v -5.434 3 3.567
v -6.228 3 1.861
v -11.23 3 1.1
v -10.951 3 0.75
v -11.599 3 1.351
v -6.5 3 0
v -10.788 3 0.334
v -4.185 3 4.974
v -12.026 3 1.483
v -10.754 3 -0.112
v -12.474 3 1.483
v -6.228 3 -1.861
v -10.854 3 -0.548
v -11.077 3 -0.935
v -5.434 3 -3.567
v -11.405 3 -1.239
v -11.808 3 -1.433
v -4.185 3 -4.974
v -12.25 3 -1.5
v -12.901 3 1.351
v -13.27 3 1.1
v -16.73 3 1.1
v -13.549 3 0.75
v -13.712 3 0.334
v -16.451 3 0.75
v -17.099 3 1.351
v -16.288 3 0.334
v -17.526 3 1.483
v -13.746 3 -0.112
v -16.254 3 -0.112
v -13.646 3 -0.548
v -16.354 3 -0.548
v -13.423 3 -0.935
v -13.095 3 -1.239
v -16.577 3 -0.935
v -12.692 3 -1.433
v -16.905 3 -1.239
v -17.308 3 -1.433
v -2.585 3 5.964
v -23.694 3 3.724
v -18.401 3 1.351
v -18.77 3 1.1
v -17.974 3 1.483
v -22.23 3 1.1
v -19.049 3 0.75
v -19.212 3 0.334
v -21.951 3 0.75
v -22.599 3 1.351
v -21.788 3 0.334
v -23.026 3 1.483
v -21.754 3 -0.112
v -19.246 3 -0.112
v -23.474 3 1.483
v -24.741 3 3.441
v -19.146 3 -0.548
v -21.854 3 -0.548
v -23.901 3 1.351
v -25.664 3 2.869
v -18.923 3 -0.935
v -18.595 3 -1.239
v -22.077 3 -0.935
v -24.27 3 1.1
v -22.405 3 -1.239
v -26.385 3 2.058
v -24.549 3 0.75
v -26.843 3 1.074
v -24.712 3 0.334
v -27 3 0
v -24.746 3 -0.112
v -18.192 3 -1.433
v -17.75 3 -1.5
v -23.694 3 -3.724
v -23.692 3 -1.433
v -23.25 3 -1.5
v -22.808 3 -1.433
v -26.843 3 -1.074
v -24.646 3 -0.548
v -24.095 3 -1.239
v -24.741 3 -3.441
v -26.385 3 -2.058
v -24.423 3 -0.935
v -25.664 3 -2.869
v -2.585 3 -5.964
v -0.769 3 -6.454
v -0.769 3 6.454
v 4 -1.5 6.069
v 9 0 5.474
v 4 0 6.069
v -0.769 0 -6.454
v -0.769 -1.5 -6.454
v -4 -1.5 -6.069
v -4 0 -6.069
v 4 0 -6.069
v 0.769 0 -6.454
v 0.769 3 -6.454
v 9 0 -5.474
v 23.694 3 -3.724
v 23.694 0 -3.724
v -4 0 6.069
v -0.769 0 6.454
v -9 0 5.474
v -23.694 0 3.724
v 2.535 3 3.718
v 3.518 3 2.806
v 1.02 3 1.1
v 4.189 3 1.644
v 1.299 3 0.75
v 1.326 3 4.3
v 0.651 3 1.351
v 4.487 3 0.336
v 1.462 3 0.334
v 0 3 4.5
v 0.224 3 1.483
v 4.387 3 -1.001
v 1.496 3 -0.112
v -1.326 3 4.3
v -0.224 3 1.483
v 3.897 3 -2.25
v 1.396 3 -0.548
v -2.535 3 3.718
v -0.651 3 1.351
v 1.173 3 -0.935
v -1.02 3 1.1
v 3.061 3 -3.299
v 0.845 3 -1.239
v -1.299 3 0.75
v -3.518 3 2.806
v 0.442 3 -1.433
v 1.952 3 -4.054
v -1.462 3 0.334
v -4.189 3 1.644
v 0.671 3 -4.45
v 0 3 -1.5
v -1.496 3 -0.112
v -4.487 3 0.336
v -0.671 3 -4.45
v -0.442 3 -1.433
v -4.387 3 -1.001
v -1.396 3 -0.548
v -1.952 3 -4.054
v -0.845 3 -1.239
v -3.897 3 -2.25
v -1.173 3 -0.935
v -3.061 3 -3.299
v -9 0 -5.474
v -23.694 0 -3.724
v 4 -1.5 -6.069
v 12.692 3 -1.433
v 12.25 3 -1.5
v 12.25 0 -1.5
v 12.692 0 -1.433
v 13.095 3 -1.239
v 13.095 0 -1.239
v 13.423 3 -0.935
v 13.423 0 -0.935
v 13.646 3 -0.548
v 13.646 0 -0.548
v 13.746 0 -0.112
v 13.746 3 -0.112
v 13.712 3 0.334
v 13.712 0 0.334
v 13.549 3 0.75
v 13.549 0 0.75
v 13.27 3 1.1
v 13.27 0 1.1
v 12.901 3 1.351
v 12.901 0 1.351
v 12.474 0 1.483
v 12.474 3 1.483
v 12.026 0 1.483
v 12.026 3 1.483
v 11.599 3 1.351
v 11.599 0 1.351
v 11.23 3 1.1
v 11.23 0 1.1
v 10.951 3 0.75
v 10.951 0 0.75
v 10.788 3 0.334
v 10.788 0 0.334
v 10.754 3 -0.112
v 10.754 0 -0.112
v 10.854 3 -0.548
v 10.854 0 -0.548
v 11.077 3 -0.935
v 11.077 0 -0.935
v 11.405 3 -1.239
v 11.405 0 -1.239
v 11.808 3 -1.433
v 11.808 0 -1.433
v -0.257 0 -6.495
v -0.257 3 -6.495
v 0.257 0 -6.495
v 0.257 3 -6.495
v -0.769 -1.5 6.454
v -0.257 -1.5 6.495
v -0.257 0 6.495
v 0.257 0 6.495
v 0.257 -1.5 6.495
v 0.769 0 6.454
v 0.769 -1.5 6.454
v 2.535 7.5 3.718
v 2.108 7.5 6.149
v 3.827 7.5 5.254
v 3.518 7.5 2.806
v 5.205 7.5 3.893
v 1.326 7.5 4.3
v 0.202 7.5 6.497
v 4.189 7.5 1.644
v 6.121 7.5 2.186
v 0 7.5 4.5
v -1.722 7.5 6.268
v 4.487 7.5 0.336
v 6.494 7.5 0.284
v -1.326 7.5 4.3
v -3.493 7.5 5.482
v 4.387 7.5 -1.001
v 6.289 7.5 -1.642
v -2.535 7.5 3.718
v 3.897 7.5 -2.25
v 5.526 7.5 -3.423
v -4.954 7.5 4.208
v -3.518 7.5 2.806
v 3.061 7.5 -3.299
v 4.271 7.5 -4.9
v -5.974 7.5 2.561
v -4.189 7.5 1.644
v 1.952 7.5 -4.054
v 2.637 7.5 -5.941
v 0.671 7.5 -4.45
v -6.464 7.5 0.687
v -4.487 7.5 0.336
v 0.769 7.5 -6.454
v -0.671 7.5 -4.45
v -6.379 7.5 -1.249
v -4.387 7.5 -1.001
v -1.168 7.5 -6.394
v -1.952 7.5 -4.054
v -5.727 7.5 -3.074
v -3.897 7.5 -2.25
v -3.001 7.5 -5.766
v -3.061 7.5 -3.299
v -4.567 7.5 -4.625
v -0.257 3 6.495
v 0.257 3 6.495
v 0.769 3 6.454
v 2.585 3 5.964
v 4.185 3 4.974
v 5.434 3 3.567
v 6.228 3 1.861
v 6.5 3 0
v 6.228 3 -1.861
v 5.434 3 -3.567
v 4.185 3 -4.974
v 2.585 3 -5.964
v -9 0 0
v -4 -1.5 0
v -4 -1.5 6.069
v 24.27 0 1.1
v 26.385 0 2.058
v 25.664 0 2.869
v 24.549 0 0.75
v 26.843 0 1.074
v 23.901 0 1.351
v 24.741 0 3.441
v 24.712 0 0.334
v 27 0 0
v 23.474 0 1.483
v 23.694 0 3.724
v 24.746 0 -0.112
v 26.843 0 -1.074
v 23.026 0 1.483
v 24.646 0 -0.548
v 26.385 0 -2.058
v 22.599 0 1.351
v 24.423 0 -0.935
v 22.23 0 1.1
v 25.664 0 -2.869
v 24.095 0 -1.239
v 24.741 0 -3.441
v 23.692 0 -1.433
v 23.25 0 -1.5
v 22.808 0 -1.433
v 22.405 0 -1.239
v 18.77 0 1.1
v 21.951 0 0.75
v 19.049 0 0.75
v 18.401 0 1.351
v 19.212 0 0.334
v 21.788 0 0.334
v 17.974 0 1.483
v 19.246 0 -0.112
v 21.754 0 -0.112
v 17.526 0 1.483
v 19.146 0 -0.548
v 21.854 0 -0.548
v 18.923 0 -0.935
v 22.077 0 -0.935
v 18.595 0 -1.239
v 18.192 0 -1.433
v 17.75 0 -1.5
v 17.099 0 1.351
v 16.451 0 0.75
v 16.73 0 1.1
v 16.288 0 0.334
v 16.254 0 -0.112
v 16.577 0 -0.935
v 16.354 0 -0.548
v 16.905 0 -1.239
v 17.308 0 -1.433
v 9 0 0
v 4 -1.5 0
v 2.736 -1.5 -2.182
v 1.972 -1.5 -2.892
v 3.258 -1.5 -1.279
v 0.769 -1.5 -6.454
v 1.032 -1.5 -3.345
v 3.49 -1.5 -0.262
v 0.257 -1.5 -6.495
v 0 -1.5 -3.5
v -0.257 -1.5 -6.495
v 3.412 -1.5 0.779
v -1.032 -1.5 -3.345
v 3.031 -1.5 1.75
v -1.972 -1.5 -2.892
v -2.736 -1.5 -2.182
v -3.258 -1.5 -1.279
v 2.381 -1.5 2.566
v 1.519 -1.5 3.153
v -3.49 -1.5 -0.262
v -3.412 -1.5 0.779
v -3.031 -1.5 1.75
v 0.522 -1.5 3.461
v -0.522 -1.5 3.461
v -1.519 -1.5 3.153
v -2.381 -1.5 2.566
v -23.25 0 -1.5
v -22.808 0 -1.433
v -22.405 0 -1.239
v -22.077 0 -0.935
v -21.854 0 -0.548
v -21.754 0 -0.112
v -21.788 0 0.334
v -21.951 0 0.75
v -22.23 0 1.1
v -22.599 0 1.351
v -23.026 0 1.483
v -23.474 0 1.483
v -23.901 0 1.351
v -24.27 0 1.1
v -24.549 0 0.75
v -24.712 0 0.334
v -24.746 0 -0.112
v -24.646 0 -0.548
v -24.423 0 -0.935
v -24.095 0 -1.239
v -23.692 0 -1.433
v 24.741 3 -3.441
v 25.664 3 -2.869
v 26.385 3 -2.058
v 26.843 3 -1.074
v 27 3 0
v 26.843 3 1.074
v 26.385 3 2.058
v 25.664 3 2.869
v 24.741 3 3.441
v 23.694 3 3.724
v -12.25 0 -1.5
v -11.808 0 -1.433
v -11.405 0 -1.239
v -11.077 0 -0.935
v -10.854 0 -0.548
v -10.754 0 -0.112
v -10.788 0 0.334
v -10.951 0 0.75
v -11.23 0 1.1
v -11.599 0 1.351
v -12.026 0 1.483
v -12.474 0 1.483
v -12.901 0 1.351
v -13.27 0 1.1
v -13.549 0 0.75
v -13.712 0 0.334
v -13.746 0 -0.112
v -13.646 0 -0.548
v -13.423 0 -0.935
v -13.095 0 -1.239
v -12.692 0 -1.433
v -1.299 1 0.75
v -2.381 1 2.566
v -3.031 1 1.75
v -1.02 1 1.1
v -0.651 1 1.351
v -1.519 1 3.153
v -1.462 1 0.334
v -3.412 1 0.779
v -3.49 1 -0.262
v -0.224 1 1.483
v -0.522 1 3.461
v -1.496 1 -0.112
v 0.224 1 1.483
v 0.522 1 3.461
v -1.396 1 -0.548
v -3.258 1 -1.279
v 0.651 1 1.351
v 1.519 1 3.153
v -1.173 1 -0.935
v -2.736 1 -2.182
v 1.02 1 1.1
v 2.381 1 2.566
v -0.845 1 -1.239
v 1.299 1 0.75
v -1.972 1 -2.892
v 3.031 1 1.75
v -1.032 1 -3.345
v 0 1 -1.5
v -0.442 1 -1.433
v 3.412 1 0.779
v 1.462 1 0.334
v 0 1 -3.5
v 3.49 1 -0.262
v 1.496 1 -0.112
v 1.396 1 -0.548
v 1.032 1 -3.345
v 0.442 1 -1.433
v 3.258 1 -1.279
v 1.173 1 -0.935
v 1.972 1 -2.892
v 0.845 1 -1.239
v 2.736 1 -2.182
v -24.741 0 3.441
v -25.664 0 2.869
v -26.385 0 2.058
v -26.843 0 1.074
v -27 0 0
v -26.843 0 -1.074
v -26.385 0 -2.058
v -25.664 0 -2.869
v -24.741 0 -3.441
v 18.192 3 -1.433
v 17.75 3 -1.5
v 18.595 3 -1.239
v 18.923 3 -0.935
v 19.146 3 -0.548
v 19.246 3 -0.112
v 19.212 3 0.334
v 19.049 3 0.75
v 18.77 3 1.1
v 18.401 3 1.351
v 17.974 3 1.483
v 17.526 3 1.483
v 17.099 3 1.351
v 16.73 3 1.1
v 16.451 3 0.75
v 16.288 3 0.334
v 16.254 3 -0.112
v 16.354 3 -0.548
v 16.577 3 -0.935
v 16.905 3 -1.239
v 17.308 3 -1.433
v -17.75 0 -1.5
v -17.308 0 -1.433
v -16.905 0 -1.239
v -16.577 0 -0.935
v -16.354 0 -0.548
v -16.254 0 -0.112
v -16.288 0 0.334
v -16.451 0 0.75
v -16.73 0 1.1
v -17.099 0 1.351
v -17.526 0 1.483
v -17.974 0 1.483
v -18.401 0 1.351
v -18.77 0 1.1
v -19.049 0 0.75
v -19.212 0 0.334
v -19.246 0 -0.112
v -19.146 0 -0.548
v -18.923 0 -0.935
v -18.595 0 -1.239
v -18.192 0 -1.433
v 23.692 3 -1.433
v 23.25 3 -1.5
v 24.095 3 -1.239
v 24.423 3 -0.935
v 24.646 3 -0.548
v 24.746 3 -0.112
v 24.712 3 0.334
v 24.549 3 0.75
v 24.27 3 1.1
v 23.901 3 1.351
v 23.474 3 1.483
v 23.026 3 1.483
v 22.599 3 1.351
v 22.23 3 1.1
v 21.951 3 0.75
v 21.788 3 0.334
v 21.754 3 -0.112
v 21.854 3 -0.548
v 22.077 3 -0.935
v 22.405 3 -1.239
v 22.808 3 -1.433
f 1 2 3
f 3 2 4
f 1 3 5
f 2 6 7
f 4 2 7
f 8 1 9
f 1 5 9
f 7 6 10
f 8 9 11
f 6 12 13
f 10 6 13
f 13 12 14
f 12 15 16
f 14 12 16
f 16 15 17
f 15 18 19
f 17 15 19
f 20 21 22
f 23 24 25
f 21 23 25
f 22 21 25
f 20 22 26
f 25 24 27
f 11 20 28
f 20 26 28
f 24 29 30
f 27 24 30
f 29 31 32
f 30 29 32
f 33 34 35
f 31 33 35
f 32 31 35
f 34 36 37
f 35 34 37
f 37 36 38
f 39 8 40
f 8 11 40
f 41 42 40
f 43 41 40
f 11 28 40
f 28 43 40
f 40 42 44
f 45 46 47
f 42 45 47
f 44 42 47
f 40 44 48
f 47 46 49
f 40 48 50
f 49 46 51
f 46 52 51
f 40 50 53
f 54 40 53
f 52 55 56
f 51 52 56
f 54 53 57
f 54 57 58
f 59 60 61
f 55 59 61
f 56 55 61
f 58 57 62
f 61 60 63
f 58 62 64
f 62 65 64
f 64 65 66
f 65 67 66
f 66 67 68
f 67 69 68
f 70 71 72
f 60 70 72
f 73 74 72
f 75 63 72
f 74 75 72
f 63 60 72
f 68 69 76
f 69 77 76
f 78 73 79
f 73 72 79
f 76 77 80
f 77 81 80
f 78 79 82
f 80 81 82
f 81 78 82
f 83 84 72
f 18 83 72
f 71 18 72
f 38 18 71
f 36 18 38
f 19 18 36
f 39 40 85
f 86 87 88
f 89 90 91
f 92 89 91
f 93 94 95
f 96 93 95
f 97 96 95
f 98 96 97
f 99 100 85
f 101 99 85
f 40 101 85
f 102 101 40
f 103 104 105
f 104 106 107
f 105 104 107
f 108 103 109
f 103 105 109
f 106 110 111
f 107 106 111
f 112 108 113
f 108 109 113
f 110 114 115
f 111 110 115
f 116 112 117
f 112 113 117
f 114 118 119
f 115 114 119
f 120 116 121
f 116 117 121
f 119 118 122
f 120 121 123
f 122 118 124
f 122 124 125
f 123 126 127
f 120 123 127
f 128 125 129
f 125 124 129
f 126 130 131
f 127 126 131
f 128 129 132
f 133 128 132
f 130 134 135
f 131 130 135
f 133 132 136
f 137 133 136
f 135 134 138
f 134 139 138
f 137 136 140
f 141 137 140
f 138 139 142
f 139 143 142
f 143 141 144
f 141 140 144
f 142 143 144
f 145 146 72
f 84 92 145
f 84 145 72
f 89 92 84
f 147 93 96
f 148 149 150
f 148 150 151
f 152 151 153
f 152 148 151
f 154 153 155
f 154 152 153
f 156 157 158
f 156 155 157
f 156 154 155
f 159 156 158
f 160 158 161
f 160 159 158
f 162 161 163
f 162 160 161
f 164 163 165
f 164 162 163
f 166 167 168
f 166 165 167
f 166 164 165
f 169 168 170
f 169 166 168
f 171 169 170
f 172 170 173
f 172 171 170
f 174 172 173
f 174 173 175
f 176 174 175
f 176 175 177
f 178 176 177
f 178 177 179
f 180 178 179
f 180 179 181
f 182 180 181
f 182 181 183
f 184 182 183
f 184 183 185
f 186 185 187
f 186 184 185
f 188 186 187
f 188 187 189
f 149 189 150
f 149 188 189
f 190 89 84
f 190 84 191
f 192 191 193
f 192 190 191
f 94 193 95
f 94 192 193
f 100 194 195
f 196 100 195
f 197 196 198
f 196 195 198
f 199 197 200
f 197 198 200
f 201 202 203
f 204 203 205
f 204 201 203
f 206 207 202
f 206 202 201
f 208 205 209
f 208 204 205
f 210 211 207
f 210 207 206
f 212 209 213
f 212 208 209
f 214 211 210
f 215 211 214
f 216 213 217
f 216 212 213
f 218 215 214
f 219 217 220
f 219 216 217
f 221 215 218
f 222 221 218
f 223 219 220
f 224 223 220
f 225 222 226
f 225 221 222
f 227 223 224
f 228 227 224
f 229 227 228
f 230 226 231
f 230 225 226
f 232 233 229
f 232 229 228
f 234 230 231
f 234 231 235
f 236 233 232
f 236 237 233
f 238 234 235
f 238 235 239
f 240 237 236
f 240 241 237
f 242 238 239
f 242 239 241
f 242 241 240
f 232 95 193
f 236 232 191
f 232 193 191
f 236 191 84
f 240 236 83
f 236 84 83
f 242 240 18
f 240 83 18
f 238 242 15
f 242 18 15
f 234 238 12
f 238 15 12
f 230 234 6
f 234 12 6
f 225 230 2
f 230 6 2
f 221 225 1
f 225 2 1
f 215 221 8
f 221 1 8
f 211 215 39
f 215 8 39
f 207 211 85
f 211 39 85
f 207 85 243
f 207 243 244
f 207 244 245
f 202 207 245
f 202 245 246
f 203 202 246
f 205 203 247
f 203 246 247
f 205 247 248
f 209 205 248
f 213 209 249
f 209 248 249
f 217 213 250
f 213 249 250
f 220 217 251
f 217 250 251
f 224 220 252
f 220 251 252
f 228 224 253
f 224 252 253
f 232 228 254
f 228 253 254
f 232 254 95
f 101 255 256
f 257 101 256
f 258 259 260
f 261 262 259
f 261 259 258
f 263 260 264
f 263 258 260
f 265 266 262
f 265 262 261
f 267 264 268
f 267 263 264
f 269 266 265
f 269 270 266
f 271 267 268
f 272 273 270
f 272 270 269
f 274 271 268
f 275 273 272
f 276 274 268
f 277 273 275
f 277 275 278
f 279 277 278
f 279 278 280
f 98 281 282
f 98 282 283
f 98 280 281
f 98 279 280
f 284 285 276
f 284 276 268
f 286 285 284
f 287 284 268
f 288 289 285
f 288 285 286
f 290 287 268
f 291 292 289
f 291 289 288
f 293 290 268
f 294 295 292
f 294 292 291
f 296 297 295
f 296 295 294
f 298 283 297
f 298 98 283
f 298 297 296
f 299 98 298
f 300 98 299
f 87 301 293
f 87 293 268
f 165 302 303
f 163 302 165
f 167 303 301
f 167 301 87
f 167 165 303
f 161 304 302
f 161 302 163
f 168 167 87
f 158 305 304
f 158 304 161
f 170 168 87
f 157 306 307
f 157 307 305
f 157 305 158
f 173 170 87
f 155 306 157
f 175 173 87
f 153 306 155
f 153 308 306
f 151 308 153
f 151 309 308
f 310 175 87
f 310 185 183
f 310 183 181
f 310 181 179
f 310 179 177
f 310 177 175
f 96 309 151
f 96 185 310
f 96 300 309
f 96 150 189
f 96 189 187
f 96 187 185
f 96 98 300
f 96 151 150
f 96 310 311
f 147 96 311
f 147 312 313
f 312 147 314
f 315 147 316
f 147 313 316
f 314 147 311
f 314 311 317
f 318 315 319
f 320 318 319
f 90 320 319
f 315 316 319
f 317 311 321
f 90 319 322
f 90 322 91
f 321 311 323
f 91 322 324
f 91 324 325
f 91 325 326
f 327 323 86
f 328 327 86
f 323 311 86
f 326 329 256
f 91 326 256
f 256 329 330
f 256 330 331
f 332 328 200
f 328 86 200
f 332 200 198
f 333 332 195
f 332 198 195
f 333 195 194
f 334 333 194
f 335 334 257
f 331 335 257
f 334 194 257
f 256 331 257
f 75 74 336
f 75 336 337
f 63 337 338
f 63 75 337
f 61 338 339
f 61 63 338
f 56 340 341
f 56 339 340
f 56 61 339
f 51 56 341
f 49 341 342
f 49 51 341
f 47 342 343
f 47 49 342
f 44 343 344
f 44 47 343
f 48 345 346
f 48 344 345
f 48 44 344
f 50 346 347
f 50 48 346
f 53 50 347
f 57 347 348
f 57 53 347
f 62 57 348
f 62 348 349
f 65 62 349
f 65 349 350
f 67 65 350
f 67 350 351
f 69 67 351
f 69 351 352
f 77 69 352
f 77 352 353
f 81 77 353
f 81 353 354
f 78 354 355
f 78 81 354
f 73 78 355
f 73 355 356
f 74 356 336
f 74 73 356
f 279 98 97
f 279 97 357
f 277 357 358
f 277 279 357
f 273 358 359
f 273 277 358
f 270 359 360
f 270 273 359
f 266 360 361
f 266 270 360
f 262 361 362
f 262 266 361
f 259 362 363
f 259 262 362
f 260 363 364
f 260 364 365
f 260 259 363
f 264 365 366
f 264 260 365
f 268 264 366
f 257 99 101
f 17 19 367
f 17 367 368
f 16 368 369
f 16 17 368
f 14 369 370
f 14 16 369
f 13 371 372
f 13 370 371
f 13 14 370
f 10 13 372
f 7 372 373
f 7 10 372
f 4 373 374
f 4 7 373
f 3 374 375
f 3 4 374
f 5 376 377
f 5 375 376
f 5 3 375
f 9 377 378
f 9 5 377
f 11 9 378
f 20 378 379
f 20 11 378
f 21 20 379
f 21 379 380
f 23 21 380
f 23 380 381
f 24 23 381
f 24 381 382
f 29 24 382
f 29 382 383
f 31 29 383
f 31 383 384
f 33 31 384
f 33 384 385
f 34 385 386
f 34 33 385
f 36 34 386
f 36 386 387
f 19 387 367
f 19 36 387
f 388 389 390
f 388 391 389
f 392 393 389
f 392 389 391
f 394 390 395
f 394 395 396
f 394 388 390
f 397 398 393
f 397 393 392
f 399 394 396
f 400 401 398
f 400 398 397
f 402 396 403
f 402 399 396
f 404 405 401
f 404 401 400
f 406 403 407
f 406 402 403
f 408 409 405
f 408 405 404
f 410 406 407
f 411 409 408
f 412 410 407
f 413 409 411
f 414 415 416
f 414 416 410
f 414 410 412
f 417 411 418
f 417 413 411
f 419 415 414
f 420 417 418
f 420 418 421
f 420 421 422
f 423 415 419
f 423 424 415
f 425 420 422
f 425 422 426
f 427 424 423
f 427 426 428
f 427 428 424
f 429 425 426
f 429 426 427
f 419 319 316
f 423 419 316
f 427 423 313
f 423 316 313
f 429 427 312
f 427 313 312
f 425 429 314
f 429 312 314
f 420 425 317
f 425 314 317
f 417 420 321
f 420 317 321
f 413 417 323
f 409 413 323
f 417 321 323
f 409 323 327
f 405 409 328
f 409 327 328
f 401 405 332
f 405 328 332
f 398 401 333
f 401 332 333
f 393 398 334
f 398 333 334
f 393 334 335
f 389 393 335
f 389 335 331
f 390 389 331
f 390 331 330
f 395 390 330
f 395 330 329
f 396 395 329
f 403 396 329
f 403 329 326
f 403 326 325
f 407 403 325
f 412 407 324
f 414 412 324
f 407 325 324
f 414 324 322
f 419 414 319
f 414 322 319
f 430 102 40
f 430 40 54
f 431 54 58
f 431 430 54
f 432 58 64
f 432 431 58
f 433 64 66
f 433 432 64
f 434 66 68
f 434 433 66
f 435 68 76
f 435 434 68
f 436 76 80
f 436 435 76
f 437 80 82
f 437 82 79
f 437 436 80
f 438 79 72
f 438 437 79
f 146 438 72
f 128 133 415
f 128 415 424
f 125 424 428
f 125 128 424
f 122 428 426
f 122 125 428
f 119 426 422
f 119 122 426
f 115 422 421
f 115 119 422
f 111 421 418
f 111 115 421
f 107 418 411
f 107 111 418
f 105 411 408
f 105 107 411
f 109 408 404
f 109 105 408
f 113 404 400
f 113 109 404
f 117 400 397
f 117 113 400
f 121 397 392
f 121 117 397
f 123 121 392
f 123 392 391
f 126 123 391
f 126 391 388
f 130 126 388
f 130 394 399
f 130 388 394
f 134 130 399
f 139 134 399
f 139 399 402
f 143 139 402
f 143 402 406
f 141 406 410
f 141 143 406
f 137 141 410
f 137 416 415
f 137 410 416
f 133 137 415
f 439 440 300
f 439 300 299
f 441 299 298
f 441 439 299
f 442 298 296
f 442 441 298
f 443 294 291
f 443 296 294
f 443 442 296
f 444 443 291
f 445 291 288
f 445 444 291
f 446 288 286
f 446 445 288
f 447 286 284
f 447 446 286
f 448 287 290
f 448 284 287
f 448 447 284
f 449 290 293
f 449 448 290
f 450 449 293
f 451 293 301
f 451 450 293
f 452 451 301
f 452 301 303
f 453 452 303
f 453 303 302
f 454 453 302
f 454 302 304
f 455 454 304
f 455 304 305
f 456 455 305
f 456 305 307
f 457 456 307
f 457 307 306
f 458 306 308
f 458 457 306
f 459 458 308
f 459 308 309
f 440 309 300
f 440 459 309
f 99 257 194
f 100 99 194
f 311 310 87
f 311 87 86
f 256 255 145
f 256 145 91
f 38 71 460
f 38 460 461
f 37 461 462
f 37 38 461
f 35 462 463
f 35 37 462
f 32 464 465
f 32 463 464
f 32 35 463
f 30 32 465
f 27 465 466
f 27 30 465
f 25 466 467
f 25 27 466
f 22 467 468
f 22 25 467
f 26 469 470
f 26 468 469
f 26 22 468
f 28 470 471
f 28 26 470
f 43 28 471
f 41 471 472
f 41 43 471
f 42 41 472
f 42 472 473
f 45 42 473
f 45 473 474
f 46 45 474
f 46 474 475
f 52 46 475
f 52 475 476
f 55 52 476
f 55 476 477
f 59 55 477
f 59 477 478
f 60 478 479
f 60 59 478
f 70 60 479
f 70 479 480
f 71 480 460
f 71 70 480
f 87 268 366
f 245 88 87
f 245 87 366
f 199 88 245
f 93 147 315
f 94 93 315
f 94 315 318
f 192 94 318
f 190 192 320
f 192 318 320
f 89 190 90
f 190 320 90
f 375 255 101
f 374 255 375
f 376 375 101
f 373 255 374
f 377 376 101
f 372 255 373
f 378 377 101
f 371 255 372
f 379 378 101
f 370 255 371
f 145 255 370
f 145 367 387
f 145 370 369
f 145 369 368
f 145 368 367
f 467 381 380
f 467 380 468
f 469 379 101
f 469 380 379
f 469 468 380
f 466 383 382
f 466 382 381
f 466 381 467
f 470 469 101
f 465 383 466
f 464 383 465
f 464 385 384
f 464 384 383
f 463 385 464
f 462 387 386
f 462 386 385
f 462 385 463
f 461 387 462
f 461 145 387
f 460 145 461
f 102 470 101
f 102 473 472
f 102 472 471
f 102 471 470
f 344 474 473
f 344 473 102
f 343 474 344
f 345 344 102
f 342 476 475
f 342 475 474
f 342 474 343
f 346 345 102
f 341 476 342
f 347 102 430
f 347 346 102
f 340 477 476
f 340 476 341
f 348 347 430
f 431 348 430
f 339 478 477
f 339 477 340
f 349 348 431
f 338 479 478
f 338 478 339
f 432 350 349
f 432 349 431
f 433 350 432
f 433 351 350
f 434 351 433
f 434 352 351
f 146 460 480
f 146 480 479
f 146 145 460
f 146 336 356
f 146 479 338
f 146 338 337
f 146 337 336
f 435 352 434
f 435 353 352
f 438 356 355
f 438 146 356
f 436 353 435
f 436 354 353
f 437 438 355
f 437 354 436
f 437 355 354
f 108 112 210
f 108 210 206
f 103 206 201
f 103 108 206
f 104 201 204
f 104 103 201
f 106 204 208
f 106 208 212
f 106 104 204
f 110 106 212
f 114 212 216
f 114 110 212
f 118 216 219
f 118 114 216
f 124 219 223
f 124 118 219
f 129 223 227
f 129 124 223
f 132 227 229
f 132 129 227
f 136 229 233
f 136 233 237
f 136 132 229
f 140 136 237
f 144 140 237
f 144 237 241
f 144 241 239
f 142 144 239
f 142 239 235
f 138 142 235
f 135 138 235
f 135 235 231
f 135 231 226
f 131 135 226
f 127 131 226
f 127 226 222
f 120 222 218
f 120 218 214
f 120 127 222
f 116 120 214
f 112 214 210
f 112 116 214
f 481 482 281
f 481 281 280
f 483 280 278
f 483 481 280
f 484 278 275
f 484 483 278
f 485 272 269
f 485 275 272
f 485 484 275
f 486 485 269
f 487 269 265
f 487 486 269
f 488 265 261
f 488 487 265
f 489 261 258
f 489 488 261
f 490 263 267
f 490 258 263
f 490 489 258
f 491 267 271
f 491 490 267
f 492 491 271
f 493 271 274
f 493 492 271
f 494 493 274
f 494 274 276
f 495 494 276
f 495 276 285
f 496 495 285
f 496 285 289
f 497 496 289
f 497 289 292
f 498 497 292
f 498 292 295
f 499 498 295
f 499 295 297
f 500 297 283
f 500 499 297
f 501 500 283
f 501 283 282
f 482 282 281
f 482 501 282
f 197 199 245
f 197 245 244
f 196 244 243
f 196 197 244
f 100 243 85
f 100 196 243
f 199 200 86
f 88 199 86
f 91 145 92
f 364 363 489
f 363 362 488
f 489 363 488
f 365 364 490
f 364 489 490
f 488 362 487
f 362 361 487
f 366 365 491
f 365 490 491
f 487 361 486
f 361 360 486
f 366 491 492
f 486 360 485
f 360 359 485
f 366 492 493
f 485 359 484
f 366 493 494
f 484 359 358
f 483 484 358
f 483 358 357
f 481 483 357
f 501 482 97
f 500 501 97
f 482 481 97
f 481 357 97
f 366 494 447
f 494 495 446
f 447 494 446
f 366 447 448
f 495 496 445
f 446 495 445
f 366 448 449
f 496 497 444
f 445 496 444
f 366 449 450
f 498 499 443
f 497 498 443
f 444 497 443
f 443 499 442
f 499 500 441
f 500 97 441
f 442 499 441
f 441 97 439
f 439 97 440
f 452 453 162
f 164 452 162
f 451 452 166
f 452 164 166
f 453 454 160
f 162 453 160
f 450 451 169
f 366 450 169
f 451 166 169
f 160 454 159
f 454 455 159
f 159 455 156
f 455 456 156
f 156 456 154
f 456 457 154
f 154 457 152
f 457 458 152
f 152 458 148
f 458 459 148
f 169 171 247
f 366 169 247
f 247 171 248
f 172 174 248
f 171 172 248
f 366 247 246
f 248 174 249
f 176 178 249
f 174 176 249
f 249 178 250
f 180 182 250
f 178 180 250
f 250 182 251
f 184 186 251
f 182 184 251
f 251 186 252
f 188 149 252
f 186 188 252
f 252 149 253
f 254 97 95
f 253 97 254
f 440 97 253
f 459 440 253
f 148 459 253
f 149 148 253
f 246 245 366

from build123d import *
from build123d.topology import SkipClean

# Parameters (mm, degrees)
SALIENTE_EXTRUIR1_DEPTH             = 3
CROQUIS2_R                          = 6.5
CROQUIS2_R_2                        = 4.5
SALIENTE_EXTRUIR2_DEPTH             = 4.5
SALIENTE_EXTRUIR3_START             = 1.5
SALIENTE_EXTRUIR3_DEPTH             = 1.5
SALIENTE_EXTRUIR4_REACH             = 30.766
SALIENTE_EXTRUIR4_DIRECTION_2_REACH = 30.766
SALIENTE_EXTRUIR5_REACH             = 30.766
SALIENTE_EXTRUIR5_DIRECTION_2_REACH = 30.766
CROQUIS7_R                          = 3.5
CORTAR_EXTRUIR1_DEPTH               = 2.5
CORTAR_EXTRUIR2_DEPTH               = 29.521921394
CORTAR_EXTRUIR2_DEPTH_BACK          = 29.521921394
CROQUIS8_R                          = 1.5


with BuildPart() as part:
    # Croquis1 → Saliente-Extruir1 (new body)
    with BuildSketch(Plane(origin=(0, 0, 0), x_dir=(1, 0, 0), z_dir=(0, 1, 0))):
        with BuildLine():
            Line((0.768817204, 6.45437217), (23.693548387, 3.723676252))
            ThreePointArc((23.693548387, 3.723676252), (27, 0), (23.693548387, -3.723676252))
            Line((23.693548387, -3.723676252), (0.768817204, -6.45437217))
            ThreePointArc((0.768817204, -6.45437217), (0, -6.5), (-0.768817204, -6.45437217))
            Line((-0.768817204, -6.45437217), (-23.693548387, -3.723676252))
            ThreePointArc((-23.693548387, -3.723676252), (-27, 0), (-23.693548387, 3.723676252))
            Line((-23.693548387, 3.723676252), (-0.768817204, 6.45437217))
            ThreePointArc((-0.768817204, 6.45437217), (0, 6.5), (0.768817204, 6.45437217))
        make_face()
    extrude(amount=SALIENTE_EXTRUIR1_DEPTH)

    # Croquis2 → Saliente-Extruir2 (add)
    with BuildSketch(Plane(origin=(0, 3, 0), x_dir=(1, 0, 0), z_dir=(0, 1, 0))):
        with Locations(Location((0, 0, 0), (0, 0, 83.207177944))):
            Circle(CROQUIS2_R)
        with Locations(Location((0, 0, 0), (0, 0, 270))):
            Circle(CROQUIS2_R_2, mode=Mode.SUBTRACT)
    extrude(amount=SALIENTE_EXTRUIR2_DEPTH)

    # Croquis3 → Saliente-Extruir3 (add)
    with SkipClean():  # the faces are left unmerged after this step: merging them gives an invalid solid
        with BuildSketch(Plane.XZ.offset(SALIENTE_EXTRUIR3_START)):
            with BuildLine():
                Line((4, -6.069487497), (0.768817204, -6.45437217))
                ThreePointArc((0.768817204, -6.45437217), (0, -6.5), (-0.768817204, -6.45437217))
                Line((-0.768817204, -6.45437217), (-4, -6.069487497))
                Line((-4, -6.069487497), (-4, 6.069487497))
                Line((-4, 6.069487497), (-0.768817204, 6.45437217))
                ThreePointArc((-0.768817204, 6.45437217), (0, 6.5), (0.768817204, 6.45437217))
                Line((0.768817204, 6.45437217), (4, 6.069487497))
                Line((4, 6.069487497), (4, -6.069487497))
            make_face()
        extrude(amount=-SALIENTE_EXTRUIR3_DEPTH)

    # Saliente-Extruir4: up to this plane
    with SkipClean():  # the faces are left unmerged after this step: merging them gives an invalid solid
        saliente_extruir4_end = Plane(origin=(-0.768817204, 3, 6.45437217), z_dir=(0.11827956989247339, 0, -0.992980333816361))
        # Croquis4 → Saliente-Extruir4 (add, up to the surface)
        with BuildSketch(Plane.XY, mode=Mode.PRIVATE) as saliente_extruir4_sk1:
            Polygon((-4, -1.5), (-4, 0), (-9, 0), align=None)
        saliente_extruir4_tool1 = split(extrude(saliente_extruir4_sk1.sketch, amount=SALIENTE_EXTRUIR4_REACH, mode=Mode.PRIVATE), bisect_by=saliente_extruir4_end, keep=Keep.BOTH, mode=Mode.PRIVATE)
        add(saliente_extruir4_tool1.solids().sort_by_distance((-5.666667, -0.5, 0))[0])

    # Saliente-Extruir4 direction 2: up to this plane
    with SkipClean():  # the faces are left unmerged after this step: merging them gives an invalid solid
        saliente_extruir4_direction_2_end = Plane(origin=(-0.768817204, 3, -6.45437217), z_dir=(0.11827956989247339, 0, 0.992980333816361))
        # Croquis4 → Saliente-Extruir4 direction 2 (add, up to the surface)
        with BuildSketch(Plane.XY, mode=Mode.PRIVATE) as saliente_extruir4_direction_2_sk1:
            Polygon((-4, -1.5), (-4, 0), (-9, 0), align=None)
        saliente_extruir4_direction_2_tool1 = split(extrude(saliente_extruir4_direction_2_sk1.sketch, amount=-SALIENTE_EXTRUIR4_DIRECTION_2_REACH, mode=Mode.PRIVATE), bisect_by=saliente_extruir4_direction_2_end, keep=Keep.BOTH, mode=Mode.PRIVATE)
        add(saliente_extruir4_direction_2_tool1.solids().sort_by_distance((-5.666667, -0.5, 0))[0])

    # Saliente-Extruir5: up to this plane
    with SkipClean():  # the faces are left unmerged after this step: merging them gives an invalid solid
        saliente_extruir5_end = Plane(origin=(0.768817204, 3, 6.45437217), z_dir=(-0.11827956989247339, 0, -0.992980333816361))
        # Croquis5 → Saliente-Extruir5 (add, up to the surface)
        with BuildSketch(Plane.XY, mode=Mode.PRIVATE) as saliente_extruir5_sk1:
            Polygon((4, 0), (9, 0), (4, -1.5), align=None)
        saliente_extruir5_tool1 = split(extrude(saliente_extruir5_sk1.sketch, amount=SALIENTE_EXTRUIR5_REACH, mode=Mode.PRIVATE), bisect_by=saliente_extruir5_end, keep=Keep.BOTH, mode=Mode.PRIVATE)
        add(saliente_extruir5_tool1.solids().sort_by_distance((5.666667, -0.5, 0))[0])

    # Saliente-Extruir5 direction 2: up to this plane
    with SkipClean():  # the faces are left unmerged after this step: merging them gives an invalid solid
        saliente_extruir5_direction_2_end = Plane(origin=(0.768817204, 3, -6.45437217), z_dir=(-0.11827956989247339, 0, 0.992980333816361))
        # Croquis5 → Saliente-Extruir5 direction 2 (add, up to the surface)
        with BuildSketch(Plane.XY, mode=Mode.PRIVATE) as saliente_extruir5_direction_2_sk1:
            Polygon((4, 0), (9, 0), (4, -1.5), align=None)
        saliente_extruir5_direction_2_tool1 = split(extrude(saliente_extruir5_direction_2_sk1.sketch, amount=-SALIENTE_EXTRUIR5_DIRECTION_2_REACH, mode=Mode.PRIVATE), bisect_by=saliente_extruir5_direction_2_end, keep=Keep.BOTH, mode=Mode.PRIVATE)
        add(saliente_extruir5_direction_2_tool1.solids().sort_by_distance((5.666667, -0.5, 0))[0])

    # Croquis7 → Cortar-Extruir1 (cut)
    with SkipClean():  # the faces are left unmerged after this step: merging them gives an invalid solid
        with BuildSketch(Plane.XZ.offset(1.5)):
            with Locations(Location((0, 0, 0), (0, 0, 270))):
                Circle(CROQUIS7_R)
        extrude(amount=-CORTAR_EXTRUIR1_DEPTH, mode=Mode.SUBTRACT)

    # Croquis8 → Cortar-Extruir2 (cut, two sides: drawn at the far end of the back side and taken through both)
    with SkipClean():  # the faces are left unmerged after this step: merging them gives an invalid solid
        with BuildSketch(Plane.XZ.offset(-1).offset(-CORTAR_EXTRUIR2_DEPTH_BACK)):
            with Locations(Location((0, 0, 0), (0, 0, 270))):
                Circle(CROQUIS8_R)
            with Locations(Location((12.25, 0, 0), (0, 0, 270))):
                Circle(CROQUIS8_R)
            with Locations(Location((17.75, 0, 0), (0, 0, 270))):
                Circle(CROQUIS8_R)
            with Locations(Location((23.25, 0, 0), (0, 0, 270))):
                Circle(CROQUIS8_R)
            with Locations(Location((-23.25, 0, 0), (0, 0, 270))):
                Circle(CROQUIS8_R)
            with Locations(Location((-17.75, 0, 0), (0, 0, 270))):
                Circle(CROQUIS8_R)
            with Locations(Location((-12.25, 0, 0), (0, 0, 270))):
                Circle(CROQUIS8_R)
        extrude(amount=CORTAR_EXTRUIR2_DEPTH + CORTAR_EXTRUIR2_DEPTH_BACK, mode=Mode.SUBTRACT)


solid = part.part
